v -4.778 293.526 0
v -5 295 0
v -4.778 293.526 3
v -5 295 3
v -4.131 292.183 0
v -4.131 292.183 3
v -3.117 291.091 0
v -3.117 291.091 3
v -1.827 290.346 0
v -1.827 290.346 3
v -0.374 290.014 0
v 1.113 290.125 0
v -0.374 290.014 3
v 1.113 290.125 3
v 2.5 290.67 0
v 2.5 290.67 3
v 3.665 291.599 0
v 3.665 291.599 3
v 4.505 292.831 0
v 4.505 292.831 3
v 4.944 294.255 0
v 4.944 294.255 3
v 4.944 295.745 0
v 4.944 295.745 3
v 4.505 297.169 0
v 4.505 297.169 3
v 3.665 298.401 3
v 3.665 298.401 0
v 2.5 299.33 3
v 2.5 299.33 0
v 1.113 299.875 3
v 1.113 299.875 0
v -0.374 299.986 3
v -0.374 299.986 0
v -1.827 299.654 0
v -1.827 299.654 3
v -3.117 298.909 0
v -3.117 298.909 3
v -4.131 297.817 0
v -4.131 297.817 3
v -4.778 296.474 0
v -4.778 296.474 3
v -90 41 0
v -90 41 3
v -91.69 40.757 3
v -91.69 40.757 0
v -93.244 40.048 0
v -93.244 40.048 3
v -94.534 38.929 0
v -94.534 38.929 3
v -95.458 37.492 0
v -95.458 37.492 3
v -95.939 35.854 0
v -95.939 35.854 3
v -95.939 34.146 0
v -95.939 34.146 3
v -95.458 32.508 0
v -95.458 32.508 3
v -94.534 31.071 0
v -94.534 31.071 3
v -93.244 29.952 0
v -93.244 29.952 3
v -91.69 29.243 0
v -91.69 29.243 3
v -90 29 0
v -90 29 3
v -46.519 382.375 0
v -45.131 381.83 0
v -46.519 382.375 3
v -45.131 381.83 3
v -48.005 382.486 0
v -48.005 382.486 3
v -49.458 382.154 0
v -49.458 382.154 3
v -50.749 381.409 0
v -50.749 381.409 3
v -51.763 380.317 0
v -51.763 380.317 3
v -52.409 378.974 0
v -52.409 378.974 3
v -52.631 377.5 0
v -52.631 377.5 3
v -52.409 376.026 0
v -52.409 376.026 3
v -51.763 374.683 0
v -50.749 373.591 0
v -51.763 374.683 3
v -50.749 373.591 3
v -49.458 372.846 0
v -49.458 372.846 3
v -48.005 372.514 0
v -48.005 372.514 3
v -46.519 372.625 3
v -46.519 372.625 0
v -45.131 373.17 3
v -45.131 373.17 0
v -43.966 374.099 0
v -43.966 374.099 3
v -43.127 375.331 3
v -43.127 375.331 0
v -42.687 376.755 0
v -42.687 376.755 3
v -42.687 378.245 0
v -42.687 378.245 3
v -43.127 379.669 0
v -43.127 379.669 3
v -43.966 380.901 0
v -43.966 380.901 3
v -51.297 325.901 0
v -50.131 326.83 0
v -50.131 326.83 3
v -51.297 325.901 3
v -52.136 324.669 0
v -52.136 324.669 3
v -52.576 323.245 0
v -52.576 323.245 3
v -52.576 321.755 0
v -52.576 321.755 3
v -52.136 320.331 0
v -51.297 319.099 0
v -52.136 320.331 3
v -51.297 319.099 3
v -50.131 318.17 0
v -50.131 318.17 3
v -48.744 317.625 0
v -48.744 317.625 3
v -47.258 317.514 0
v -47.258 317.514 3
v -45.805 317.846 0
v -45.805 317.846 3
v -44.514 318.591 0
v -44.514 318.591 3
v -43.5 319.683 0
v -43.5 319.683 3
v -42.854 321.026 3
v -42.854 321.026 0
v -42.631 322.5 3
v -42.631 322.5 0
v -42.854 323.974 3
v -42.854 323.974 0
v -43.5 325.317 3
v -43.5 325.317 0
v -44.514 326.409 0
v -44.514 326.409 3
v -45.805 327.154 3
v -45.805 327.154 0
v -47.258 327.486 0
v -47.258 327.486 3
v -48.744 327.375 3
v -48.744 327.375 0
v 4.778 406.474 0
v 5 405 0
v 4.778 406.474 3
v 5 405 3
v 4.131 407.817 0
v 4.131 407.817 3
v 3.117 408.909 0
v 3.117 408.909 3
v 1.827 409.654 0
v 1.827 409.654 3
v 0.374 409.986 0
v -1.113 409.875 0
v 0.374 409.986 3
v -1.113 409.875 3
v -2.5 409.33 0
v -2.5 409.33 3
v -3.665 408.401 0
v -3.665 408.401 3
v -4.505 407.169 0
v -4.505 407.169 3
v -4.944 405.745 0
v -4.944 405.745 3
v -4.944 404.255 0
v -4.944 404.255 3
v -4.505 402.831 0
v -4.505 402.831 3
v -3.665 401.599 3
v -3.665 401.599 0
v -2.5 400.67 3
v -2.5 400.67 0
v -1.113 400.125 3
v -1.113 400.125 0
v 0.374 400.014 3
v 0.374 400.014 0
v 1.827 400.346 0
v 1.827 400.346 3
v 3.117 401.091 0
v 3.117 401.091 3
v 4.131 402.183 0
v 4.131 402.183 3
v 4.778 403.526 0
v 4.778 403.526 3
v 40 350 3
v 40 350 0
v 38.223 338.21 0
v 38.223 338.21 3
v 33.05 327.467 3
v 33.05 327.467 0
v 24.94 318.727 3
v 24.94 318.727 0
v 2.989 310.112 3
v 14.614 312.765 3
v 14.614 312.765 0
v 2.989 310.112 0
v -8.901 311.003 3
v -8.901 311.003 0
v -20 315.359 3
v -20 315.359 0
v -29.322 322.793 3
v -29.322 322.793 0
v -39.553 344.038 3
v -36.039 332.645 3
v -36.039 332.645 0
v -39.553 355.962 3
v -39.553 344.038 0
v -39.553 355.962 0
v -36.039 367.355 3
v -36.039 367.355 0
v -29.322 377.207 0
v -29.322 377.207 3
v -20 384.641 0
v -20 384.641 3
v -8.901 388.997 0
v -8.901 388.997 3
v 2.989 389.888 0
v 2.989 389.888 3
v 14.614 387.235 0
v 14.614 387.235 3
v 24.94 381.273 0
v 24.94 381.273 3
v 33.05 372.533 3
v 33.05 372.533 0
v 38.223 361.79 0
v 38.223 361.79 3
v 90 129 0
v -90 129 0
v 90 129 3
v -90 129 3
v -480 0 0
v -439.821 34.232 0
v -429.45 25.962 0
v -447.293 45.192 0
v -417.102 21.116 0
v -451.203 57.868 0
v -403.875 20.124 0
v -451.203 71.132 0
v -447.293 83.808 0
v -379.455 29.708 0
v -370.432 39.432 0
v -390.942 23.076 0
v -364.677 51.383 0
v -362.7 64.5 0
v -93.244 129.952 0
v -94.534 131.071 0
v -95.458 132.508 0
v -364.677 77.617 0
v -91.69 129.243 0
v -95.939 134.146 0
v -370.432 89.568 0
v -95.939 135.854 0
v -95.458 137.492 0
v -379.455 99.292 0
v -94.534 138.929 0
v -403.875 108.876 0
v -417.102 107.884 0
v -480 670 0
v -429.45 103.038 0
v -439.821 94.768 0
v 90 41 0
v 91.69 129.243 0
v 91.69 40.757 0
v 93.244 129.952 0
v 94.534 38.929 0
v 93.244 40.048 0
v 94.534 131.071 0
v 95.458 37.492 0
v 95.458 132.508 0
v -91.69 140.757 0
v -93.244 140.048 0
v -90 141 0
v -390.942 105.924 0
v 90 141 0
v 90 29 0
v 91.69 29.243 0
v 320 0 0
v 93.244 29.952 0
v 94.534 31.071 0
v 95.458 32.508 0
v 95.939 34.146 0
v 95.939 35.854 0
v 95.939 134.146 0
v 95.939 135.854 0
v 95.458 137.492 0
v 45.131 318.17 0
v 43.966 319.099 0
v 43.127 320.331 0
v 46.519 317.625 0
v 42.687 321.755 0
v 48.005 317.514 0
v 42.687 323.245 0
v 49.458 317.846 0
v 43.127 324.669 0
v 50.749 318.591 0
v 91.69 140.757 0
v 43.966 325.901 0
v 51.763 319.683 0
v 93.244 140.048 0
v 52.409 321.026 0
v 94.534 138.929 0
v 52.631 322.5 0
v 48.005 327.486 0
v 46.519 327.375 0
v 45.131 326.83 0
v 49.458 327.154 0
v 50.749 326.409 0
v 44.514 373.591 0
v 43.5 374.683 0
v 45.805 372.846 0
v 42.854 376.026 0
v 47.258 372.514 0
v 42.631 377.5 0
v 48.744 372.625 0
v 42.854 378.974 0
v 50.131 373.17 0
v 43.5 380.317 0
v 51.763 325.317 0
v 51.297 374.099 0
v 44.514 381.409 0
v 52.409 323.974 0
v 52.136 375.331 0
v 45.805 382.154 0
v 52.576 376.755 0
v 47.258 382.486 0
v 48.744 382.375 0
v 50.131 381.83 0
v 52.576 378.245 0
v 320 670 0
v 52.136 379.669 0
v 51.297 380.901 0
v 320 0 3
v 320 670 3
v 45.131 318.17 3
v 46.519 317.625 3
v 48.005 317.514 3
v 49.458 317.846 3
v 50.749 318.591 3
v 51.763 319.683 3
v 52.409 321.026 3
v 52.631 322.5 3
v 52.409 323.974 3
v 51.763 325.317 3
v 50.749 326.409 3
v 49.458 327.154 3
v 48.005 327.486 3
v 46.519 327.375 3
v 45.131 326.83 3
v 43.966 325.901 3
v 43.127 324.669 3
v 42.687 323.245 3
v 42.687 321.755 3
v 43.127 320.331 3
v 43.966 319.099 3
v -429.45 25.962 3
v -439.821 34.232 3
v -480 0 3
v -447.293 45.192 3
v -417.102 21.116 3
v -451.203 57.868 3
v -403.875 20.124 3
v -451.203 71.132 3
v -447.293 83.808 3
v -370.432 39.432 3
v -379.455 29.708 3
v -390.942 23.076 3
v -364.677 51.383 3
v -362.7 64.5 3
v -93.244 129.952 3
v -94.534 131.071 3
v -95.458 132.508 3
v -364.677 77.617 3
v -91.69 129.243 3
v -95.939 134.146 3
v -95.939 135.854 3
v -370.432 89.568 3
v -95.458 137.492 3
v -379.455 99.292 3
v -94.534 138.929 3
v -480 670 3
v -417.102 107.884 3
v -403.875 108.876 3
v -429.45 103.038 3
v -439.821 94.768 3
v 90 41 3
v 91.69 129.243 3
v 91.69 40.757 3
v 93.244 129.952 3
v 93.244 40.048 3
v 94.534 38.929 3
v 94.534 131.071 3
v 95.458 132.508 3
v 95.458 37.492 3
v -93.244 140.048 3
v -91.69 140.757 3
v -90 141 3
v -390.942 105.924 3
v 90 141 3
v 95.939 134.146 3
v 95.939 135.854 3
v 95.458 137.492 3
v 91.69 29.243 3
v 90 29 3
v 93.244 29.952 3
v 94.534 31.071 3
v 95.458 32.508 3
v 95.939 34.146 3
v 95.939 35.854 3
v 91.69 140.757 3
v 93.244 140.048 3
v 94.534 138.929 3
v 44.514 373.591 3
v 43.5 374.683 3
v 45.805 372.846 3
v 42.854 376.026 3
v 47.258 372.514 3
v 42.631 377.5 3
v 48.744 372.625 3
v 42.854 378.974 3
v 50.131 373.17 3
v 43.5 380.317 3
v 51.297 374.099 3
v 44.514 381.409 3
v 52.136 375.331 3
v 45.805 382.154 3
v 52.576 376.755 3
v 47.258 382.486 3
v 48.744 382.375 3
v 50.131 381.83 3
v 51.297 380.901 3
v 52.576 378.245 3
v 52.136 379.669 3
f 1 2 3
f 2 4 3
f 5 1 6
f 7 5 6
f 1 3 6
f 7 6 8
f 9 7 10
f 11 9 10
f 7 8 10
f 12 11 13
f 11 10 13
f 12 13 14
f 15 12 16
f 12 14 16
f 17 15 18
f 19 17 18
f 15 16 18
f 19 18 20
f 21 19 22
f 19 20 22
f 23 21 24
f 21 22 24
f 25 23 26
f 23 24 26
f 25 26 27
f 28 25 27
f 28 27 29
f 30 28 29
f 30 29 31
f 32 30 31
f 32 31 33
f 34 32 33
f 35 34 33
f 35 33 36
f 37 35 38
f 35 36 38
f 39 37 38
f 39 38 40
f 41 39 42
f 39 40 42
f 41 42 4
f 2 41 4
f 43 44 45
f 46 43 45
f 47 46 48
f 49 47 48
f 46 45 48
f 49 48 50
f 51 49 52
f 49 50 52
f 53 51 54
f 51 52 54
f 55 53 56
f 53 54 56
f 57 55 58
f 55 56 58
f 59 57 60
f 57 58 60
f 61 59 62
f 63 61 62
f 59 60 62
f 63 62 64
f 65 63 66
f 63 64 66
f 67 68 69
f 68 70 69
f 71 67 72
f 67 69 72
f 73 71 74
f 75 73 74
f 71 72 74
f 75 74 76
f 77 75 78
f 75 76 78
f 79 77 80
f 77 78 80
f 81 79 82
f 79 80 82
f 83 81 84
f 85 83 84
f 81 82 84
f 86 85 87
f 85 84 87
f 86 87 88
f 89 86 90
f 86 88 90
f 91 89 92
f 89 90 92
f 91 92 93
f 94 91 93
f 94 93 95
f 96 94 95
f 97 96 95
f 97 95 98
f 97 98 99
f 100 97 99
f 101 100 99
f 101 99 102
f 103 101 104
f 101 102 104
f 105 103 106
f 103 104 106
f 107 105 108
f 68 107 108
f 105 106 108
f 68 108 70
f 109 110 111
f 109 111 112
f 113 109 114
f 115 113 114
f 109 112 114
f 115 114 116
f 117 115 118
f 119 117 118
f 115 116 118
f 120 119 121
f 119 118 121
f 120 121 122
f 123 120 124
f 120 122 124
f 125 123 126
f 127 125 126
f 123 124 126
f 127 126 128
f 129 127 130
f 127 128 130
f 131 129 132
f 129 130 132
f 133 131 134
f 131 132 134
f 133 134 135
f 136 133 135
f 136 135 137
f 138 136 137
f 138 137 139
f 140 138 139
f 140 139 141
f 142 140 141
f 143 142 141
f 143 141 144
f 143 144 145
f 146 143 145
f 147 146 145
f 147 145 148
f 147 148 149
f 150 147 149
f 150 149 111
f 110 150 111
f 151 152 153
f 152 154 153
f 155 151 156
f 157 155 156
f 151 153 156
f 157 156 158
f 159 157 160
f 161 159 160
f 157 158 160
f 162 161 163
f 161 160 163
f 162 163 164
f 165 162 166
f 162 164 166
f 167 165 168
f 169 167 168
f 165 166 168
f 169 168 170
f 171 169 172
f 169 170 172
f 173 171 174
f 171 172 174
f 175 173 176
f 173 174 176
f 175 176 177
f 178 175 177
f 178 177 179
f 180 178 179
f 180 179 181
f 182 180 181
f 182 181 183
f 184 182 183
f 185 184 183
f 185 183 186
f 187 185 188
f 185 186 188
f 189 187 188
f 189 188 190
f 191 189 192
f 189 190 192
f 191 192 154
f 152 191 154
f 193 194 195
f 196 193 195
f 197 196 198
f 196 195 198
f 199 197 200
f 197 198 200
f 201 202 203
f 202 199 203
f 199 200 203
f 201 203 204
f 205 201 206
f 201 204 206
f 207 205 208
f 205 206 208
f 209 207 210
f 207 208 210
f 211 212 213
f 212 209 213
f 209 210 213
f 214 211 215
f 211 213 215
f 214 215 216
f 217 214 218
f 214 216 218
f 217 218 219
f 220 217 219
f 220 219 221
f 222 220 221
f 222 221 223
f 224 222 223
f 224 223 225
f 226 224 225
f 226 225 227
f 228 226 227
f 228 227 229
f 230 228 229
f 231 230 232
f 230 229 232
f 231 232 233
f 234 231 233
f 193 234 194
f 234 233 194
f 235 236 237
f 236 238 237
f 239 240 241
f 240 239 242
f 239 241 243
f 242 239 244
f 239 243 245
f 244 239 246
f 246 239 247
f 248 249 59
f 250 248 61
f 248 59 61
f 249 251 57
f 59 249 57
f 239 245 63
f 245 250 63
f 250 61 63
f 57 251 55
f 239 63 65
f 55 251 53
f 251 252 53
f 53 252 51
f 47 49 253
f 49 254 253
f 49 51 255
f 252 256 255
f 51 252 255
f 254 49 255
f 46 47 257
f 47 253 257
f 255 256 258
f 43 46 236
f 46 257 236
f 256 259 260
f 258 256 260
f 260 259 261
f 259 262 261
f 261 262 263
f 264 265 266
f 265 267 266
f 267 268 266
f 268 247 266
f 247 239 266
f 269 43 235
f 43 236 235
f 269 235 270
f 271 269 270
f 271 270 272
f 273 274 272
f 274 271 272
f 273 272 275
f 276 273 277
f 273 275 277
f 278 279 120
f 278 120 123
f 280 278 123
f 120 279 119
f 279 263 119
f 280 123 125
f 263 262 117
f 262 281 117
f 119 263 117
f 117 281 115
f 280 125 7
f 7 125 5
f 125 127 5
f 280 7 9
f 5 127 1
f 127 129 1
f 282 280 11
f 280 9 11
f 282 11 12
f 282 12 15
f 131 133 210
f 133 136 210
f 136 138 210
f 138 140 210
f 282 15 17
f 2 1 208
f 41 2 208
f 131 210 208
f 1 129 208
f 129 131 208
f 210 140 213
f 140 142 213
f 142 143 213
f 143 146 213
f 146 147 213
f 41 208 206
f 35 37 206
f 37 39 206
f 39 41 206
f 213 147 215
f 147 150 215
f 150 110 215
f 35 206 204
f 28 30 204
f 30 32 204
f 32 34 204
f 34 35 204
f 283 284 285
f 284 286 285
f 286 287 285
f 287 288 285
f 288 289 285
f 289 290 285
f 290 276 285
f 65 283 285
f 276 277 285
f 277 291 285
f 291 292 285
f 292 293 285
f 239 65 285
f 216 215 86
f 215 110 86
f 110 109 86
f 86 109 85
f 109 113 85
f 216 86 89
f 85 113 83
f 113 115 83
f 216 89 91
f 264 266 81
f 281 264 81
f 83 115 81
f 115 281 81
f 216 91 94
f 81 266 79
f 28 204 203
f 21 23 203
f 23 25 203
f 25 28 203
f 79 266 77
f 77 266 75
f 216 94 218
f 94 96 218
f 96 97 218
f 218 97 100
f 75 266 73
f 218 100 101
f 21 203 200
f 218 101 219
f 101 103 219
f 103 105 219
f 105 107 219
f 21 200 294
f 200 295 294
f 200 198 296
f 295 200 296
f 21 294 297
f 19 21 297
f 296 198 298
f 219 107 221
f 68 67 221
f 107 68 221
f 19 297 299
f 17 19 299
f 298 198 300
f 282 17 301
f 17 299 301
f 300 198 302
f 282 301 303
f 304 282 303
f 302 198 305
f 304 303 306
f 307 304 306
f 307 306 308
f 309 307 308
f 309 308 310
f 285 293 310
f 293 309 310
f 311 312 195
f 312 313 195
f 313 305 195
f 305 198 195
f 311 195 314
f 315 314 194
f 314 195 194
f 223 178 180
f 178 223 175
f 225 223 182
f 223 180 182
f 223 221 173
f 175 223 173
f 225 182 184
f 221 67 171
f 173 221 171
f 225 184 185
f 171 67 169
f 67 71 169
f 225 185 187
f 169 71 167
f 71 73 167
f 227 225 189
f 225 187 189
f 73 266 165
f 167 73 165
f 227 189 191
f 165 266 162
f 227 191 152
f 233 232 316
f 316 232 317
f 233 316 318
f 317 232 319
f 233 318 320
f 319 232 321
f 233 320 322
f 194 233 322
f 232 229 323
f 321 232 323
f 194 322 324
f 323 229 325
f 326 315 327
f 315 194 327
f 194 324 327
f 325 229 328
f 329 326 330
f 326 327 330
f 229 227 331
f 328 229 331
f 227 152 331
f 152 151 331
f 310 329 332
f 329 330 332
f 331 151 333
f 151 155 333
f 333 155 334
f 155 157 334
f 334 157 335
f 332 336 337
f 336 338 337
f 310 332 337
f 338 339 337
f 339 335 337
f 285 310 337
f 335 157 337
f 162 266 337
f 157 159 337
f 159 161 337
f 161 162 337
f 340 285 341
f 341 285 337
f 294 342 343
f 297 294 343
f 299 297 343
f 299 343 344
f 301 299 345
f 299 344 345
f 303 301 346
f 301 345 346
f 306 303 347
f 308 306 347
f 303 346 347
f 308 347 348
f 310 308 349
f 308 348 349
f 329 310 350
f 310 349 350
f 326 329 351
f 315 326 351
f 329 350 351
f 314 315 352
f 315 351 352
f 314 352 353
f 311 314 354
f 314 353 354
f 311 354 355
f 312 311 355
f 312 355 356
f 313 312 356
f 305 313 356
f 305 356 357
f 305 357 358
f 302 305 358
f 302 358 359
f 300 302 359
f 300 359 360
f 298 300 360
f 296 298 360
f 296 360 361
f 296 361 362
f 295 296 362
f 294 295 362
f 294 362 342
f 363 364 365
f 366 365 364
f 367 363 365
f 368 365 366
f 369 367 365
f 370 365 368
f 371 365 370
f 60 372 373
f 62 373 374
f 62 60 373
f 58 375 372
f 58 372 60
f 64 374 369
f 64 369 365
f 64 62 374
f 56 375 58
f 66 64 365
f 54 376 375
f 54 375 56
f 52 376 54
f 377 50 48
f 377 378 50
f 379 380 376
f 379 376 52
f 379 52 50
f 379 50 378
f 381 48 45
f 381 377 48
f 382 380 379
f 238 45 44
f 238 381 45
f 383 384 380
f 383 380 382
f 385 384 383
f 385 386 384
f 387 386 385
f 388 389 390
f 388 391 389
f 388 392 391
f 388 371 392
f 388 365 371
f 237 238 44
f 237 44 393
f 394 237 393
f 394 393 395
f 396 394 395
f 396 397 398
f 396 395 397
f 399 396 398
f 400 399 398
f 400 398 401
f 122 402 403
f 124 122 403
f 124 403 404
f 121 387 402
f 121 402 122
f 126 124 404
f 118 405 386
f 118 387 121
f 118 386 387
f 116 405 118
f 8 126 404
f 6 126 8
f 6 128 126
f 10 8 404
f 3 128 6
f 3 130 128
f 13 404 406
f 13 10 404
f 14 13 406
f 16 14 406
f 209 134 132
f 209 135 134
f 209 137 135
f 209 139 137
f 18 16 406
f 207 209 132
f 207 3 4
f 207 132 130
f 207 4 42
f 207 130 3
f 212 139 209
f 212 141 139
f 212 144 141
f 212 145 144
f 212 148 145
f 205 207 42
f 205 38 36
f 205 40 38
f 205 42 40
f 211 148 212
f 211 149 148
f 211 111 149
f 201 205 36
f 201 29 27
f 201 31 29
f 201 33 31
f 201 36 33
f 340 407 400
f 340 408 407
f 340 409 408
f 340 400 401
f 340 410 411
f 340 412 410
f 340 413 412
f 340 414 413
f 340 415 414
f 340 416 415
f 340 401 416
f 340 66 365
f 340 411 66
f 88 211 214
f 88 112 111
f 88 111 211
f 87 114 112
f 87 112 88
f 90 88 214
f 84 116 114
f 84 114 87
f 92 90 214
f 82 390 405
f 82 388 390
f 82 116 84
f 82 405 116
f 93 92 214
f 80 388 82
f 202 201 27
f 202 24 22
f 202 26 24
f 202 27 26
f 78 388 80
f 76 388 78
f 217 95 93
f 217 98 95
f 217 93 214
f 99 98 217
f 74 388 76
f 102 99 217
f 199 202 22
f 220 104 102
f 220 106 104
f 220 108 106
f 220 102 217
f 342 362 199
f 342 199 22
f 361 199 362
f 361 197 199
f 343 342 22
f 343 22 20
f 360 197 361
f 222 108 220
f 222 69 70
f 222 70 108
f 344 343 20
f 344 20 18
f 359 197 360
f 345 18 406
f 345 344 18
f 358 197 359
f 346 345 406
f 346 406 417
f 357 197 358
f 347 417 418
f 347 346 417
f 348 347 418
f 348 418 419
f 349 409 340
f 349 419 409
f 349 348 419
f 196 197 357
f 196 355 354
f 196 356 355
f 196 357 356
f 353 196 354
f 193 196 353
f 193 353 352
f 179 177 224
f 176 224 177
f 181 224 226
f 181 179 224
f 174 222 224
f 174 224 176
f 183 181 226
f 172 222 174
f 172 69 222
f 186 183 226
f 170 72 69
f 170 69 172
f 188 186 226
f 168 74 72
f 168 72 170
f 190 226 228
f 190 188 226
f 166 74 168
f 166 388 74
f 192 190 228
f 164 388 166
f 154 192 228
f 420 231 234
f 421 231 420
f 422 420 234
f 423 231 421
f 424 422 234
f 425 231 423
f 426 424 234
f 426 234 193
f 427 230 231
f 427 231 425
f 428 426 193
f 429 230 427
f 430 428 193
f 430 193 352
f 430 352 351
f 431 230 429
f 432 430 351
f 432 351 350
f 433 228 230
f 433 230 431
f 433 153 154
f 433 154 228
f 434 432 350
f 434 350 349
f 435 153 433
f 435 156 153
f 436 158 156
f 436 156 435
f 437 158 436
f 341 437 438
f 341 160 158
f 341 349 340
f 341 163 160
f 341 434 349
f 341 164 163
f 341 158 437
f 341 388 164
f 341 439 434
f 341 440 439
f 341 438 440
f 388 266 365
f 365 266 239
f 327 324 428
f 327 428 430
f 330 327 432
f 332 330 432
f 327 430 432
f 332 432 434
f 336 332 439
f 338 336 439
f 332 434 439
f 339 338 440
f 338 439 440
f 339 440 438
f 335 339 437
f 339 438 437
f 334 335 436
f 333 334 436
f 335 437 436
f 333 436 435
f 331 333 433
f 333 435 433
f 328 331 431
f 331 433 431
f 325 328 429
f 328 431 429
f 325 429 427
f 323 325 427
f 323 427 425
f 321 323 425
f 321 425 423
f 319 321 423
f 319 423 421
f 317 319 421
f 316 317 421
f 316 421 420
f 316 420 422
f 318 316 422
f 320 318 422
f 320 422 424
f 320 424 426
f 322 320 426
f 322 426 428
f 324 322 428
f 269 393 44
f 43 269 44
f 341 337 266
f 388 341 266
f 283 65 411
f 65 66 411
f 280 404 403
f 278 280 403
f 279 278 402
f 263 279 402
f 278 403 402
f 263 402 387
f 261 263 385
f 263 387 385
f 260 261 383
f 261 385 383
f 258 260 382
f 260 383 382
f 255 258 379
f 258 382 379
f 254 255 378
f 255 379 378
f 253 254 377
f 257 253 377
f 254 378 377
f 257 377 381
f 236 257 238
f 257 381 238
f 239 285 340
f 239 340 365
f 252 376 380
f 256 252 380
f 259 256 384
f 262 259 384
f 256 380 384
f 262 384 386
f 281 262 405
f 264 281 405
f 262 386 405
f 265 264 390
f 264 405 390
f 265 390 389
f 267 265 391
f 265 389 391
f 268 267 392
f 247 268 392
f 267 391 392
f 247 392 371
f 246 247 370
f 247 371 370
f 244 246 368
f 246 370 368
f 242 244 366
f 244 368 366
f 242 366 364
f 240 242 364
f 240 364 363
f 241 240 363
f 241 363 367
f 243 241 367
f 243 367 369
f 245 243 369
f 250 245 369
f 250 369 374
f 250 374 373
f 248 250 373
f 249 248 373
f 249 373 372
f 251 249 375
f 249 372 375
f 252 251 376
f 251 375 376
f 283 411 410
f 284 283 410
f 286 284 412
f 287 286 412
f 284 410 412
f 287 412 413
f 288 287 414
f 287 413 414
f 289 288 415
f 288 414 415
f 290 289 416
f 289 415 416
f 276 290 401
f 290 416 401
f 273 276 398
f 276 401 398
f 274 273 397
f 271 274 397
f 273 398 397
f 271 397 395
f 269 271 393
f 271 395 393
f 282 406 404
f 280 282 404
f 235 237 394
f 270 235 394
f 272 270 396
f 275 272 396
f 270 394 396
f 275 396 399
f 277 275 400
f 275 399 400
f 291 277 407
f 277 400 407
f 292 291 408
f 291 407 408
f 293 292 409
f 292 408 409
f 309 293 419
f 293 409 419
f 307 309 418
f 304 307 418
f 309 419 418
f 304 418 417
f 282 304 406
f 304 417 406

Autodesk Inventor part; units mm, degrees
ref_plane "YZ Plane" through (0, 0, 0) normal (1, 0, 0) x (0, 1, 0)
ref_plane "XZ Plane" through (0, 0, 0) normal (0, 1, 0) x (-1, 0, 0)
ref_plane "XY Plane" through (0, 0, 0) normal (0, 0, 1) x (1, 0, 0)
sketch "Sketch1" plane through (0, 0, 0) normal (0, 0, 1) x (1, 0, 0)
  line L0 (320, 0) -> (320, 670)
  line L1 (320, 670) -> (-480, 670)
  line L2 (-480, 670) -> (-480, 0)
  circle A0 centre (0, 350) radius 40
  line L3 (320, 0) -> (-480, 0)
  point P0 (0, 0)
  dimension "d14" = 80
  dimension "d15" = 320
  dimension "d17" = 320
  dimension "d26" = 800
  dimension "d27" = 670
extrude "Plate1" add sketch "Sketch1" along normal blind 3
sketch "Sketch3" plane through (0, 0, 3) normal (0, 0, 1) x (1, 0, 0)
  circle A0 centre (0, 405) radius 5
  circle A1 centre (0, 350) radius 40 projected
  point P0 (0, 0)
  dimension "d19" = 10
  dimension "d20" = 55
extrude "Cut1" cut sketch "Sketch3" against normal through all contours A0
pattern_circular "Circular Pattern1" count 6 over 360 about axis through (0, 350, 0) along (0, 0, 1) of "Cut1"
sketch "Sketch4" plane through (0, 0, 3) normal (0, 0, 1) x (1, 0, 0)
  line L0 (100, 650) -> (300, 650) construction
  line L1 (300, 650) -> (300, 630) construction
  line L2 (300, 630) -> (100, 630) construction
  line L3 (100, 630) -> (100, 650) construction
  line L4 (-480, 670) -> (320, 670) projected
  line L5 (320, 670) -> (320, 0) projected
  point P0 (0, 0)
  dimension "d28" = 200
  dimension "d29" = 20
  dimension "d30" = 20
  dimension "d31" = 20
mark "Mark2"
sketch "Sketch5" plane through (-480, 670, 3) normal (0, 0, 1) x (1, 0, 0)
  circle A0 centre (72.8, -605.5) radius 44.5
  line L0 (0, -670) -> (0, 0) projected
  line L1 (800, -670) -> (0, -670) projected
  dimension "d32" = 72.8
  dimension "d33" = 89
  dimension "d34" = 64.5
extrude "Extrusion1" cut sketch "Sketch5" against normal through all
sketch "Sketch6" plane through (-480, 670, 3) normal (0, 0, 1) x (1, 0, 0)
  circle A0 centre (480, -320) radius 40 projected
  line L0 (480, -320) -> (480, -670) construction
  line L1 (0, -670) -> (800, -670) projected
  line L2 (390, -535) -> (570, -535) construction
  line L3 (390, -541) -> (570, -541)
  line L4 (570, -529) -> (390, -529)
  arc A1 (390, -529) -> (390, -541) centre (390, -535) ccw
  arc A2 (570, -541) -> (570, -529) centre (570, -535) ccw
  line L5 (390, -635) -> (570, -635) construction
  line L6 (390, -641) -> (570, -641)
  line L7 (570, -629) -> (390, -629)
  arc A3 (390, -629) -> (390, -641) centre (390, -635) ccw
  arc A4 (570, -641) -> (570, -629) centre (570, -635) ccw
  line L8 (480, -535) -> (480, -635) construction
  line L9 (366, -515) -> (594, -515) construction
  line L10 (594, -515) -> (594, -655) construction
  line L11 (594, -655) -> (366, -655) construction
  line L12 (366, -655) -> (366, -515) construction
  line L13 (366, -515) -> (594, -655) construction
  circle A5 centre (366, -515) radius 2.5
  line L14 (442, -515) -> (442, -655) construction
  line L15 (518, -515) -> (518, -655) construction
  circle A6 centre (442, -515) radius 2.5
  circle A7 centre (518, -515) radius 2.5
  circle A8 centre (594, -515) radius 2.5
  circle A9 centre (594, -585) radius 2.5
  circle A10 centre (594, -655) radius 2.5
  circle A11 centre (518, -655) radius 2.5
  circle A12 centre (442, -655) radius 2.5
  circle A13 centre (366, -655) radius 2.5
  circle A14 centre (366, -585) radius 2.5
  point P0 (480, -585)
  dimension "d37" = 180
  dimension "d38" = 12
  dimension "d41" = 100
  dimension "d42" = 85
  dimension "d43" = 228
  dimension "d45" = 5
  dimension "d46" = 140
  dimension "d47" = 76
  dimension "d48" = 76
extrude "Extrusion2" cut sketch "Sketch6" against normal through all contours A1 L4 A2 L3 | A3 L7 A4 L6
equation "\"d2\" = Thickness"
equation "\"BendReliefWidth\" = Thickness"
equation "\"BendReliefDepth\" = 0.5 * Thickness"
equation "\"CornerReliefSize\" = 4 * Thickness"
equation "\"MinimumRemnant\" = 2 * Thickness"
equation "\"TransitionRadius\" = BendRadius"
equation "\"JacobiRadiusSize\" = BendRadius"
equation "\"GapSize\" = Thickness"
equation "\"Thickness\" = 3"
equation "\"BendRadius\" = 2.75"
properties part number "TRM 016 right board main++" material "AISI 304"
